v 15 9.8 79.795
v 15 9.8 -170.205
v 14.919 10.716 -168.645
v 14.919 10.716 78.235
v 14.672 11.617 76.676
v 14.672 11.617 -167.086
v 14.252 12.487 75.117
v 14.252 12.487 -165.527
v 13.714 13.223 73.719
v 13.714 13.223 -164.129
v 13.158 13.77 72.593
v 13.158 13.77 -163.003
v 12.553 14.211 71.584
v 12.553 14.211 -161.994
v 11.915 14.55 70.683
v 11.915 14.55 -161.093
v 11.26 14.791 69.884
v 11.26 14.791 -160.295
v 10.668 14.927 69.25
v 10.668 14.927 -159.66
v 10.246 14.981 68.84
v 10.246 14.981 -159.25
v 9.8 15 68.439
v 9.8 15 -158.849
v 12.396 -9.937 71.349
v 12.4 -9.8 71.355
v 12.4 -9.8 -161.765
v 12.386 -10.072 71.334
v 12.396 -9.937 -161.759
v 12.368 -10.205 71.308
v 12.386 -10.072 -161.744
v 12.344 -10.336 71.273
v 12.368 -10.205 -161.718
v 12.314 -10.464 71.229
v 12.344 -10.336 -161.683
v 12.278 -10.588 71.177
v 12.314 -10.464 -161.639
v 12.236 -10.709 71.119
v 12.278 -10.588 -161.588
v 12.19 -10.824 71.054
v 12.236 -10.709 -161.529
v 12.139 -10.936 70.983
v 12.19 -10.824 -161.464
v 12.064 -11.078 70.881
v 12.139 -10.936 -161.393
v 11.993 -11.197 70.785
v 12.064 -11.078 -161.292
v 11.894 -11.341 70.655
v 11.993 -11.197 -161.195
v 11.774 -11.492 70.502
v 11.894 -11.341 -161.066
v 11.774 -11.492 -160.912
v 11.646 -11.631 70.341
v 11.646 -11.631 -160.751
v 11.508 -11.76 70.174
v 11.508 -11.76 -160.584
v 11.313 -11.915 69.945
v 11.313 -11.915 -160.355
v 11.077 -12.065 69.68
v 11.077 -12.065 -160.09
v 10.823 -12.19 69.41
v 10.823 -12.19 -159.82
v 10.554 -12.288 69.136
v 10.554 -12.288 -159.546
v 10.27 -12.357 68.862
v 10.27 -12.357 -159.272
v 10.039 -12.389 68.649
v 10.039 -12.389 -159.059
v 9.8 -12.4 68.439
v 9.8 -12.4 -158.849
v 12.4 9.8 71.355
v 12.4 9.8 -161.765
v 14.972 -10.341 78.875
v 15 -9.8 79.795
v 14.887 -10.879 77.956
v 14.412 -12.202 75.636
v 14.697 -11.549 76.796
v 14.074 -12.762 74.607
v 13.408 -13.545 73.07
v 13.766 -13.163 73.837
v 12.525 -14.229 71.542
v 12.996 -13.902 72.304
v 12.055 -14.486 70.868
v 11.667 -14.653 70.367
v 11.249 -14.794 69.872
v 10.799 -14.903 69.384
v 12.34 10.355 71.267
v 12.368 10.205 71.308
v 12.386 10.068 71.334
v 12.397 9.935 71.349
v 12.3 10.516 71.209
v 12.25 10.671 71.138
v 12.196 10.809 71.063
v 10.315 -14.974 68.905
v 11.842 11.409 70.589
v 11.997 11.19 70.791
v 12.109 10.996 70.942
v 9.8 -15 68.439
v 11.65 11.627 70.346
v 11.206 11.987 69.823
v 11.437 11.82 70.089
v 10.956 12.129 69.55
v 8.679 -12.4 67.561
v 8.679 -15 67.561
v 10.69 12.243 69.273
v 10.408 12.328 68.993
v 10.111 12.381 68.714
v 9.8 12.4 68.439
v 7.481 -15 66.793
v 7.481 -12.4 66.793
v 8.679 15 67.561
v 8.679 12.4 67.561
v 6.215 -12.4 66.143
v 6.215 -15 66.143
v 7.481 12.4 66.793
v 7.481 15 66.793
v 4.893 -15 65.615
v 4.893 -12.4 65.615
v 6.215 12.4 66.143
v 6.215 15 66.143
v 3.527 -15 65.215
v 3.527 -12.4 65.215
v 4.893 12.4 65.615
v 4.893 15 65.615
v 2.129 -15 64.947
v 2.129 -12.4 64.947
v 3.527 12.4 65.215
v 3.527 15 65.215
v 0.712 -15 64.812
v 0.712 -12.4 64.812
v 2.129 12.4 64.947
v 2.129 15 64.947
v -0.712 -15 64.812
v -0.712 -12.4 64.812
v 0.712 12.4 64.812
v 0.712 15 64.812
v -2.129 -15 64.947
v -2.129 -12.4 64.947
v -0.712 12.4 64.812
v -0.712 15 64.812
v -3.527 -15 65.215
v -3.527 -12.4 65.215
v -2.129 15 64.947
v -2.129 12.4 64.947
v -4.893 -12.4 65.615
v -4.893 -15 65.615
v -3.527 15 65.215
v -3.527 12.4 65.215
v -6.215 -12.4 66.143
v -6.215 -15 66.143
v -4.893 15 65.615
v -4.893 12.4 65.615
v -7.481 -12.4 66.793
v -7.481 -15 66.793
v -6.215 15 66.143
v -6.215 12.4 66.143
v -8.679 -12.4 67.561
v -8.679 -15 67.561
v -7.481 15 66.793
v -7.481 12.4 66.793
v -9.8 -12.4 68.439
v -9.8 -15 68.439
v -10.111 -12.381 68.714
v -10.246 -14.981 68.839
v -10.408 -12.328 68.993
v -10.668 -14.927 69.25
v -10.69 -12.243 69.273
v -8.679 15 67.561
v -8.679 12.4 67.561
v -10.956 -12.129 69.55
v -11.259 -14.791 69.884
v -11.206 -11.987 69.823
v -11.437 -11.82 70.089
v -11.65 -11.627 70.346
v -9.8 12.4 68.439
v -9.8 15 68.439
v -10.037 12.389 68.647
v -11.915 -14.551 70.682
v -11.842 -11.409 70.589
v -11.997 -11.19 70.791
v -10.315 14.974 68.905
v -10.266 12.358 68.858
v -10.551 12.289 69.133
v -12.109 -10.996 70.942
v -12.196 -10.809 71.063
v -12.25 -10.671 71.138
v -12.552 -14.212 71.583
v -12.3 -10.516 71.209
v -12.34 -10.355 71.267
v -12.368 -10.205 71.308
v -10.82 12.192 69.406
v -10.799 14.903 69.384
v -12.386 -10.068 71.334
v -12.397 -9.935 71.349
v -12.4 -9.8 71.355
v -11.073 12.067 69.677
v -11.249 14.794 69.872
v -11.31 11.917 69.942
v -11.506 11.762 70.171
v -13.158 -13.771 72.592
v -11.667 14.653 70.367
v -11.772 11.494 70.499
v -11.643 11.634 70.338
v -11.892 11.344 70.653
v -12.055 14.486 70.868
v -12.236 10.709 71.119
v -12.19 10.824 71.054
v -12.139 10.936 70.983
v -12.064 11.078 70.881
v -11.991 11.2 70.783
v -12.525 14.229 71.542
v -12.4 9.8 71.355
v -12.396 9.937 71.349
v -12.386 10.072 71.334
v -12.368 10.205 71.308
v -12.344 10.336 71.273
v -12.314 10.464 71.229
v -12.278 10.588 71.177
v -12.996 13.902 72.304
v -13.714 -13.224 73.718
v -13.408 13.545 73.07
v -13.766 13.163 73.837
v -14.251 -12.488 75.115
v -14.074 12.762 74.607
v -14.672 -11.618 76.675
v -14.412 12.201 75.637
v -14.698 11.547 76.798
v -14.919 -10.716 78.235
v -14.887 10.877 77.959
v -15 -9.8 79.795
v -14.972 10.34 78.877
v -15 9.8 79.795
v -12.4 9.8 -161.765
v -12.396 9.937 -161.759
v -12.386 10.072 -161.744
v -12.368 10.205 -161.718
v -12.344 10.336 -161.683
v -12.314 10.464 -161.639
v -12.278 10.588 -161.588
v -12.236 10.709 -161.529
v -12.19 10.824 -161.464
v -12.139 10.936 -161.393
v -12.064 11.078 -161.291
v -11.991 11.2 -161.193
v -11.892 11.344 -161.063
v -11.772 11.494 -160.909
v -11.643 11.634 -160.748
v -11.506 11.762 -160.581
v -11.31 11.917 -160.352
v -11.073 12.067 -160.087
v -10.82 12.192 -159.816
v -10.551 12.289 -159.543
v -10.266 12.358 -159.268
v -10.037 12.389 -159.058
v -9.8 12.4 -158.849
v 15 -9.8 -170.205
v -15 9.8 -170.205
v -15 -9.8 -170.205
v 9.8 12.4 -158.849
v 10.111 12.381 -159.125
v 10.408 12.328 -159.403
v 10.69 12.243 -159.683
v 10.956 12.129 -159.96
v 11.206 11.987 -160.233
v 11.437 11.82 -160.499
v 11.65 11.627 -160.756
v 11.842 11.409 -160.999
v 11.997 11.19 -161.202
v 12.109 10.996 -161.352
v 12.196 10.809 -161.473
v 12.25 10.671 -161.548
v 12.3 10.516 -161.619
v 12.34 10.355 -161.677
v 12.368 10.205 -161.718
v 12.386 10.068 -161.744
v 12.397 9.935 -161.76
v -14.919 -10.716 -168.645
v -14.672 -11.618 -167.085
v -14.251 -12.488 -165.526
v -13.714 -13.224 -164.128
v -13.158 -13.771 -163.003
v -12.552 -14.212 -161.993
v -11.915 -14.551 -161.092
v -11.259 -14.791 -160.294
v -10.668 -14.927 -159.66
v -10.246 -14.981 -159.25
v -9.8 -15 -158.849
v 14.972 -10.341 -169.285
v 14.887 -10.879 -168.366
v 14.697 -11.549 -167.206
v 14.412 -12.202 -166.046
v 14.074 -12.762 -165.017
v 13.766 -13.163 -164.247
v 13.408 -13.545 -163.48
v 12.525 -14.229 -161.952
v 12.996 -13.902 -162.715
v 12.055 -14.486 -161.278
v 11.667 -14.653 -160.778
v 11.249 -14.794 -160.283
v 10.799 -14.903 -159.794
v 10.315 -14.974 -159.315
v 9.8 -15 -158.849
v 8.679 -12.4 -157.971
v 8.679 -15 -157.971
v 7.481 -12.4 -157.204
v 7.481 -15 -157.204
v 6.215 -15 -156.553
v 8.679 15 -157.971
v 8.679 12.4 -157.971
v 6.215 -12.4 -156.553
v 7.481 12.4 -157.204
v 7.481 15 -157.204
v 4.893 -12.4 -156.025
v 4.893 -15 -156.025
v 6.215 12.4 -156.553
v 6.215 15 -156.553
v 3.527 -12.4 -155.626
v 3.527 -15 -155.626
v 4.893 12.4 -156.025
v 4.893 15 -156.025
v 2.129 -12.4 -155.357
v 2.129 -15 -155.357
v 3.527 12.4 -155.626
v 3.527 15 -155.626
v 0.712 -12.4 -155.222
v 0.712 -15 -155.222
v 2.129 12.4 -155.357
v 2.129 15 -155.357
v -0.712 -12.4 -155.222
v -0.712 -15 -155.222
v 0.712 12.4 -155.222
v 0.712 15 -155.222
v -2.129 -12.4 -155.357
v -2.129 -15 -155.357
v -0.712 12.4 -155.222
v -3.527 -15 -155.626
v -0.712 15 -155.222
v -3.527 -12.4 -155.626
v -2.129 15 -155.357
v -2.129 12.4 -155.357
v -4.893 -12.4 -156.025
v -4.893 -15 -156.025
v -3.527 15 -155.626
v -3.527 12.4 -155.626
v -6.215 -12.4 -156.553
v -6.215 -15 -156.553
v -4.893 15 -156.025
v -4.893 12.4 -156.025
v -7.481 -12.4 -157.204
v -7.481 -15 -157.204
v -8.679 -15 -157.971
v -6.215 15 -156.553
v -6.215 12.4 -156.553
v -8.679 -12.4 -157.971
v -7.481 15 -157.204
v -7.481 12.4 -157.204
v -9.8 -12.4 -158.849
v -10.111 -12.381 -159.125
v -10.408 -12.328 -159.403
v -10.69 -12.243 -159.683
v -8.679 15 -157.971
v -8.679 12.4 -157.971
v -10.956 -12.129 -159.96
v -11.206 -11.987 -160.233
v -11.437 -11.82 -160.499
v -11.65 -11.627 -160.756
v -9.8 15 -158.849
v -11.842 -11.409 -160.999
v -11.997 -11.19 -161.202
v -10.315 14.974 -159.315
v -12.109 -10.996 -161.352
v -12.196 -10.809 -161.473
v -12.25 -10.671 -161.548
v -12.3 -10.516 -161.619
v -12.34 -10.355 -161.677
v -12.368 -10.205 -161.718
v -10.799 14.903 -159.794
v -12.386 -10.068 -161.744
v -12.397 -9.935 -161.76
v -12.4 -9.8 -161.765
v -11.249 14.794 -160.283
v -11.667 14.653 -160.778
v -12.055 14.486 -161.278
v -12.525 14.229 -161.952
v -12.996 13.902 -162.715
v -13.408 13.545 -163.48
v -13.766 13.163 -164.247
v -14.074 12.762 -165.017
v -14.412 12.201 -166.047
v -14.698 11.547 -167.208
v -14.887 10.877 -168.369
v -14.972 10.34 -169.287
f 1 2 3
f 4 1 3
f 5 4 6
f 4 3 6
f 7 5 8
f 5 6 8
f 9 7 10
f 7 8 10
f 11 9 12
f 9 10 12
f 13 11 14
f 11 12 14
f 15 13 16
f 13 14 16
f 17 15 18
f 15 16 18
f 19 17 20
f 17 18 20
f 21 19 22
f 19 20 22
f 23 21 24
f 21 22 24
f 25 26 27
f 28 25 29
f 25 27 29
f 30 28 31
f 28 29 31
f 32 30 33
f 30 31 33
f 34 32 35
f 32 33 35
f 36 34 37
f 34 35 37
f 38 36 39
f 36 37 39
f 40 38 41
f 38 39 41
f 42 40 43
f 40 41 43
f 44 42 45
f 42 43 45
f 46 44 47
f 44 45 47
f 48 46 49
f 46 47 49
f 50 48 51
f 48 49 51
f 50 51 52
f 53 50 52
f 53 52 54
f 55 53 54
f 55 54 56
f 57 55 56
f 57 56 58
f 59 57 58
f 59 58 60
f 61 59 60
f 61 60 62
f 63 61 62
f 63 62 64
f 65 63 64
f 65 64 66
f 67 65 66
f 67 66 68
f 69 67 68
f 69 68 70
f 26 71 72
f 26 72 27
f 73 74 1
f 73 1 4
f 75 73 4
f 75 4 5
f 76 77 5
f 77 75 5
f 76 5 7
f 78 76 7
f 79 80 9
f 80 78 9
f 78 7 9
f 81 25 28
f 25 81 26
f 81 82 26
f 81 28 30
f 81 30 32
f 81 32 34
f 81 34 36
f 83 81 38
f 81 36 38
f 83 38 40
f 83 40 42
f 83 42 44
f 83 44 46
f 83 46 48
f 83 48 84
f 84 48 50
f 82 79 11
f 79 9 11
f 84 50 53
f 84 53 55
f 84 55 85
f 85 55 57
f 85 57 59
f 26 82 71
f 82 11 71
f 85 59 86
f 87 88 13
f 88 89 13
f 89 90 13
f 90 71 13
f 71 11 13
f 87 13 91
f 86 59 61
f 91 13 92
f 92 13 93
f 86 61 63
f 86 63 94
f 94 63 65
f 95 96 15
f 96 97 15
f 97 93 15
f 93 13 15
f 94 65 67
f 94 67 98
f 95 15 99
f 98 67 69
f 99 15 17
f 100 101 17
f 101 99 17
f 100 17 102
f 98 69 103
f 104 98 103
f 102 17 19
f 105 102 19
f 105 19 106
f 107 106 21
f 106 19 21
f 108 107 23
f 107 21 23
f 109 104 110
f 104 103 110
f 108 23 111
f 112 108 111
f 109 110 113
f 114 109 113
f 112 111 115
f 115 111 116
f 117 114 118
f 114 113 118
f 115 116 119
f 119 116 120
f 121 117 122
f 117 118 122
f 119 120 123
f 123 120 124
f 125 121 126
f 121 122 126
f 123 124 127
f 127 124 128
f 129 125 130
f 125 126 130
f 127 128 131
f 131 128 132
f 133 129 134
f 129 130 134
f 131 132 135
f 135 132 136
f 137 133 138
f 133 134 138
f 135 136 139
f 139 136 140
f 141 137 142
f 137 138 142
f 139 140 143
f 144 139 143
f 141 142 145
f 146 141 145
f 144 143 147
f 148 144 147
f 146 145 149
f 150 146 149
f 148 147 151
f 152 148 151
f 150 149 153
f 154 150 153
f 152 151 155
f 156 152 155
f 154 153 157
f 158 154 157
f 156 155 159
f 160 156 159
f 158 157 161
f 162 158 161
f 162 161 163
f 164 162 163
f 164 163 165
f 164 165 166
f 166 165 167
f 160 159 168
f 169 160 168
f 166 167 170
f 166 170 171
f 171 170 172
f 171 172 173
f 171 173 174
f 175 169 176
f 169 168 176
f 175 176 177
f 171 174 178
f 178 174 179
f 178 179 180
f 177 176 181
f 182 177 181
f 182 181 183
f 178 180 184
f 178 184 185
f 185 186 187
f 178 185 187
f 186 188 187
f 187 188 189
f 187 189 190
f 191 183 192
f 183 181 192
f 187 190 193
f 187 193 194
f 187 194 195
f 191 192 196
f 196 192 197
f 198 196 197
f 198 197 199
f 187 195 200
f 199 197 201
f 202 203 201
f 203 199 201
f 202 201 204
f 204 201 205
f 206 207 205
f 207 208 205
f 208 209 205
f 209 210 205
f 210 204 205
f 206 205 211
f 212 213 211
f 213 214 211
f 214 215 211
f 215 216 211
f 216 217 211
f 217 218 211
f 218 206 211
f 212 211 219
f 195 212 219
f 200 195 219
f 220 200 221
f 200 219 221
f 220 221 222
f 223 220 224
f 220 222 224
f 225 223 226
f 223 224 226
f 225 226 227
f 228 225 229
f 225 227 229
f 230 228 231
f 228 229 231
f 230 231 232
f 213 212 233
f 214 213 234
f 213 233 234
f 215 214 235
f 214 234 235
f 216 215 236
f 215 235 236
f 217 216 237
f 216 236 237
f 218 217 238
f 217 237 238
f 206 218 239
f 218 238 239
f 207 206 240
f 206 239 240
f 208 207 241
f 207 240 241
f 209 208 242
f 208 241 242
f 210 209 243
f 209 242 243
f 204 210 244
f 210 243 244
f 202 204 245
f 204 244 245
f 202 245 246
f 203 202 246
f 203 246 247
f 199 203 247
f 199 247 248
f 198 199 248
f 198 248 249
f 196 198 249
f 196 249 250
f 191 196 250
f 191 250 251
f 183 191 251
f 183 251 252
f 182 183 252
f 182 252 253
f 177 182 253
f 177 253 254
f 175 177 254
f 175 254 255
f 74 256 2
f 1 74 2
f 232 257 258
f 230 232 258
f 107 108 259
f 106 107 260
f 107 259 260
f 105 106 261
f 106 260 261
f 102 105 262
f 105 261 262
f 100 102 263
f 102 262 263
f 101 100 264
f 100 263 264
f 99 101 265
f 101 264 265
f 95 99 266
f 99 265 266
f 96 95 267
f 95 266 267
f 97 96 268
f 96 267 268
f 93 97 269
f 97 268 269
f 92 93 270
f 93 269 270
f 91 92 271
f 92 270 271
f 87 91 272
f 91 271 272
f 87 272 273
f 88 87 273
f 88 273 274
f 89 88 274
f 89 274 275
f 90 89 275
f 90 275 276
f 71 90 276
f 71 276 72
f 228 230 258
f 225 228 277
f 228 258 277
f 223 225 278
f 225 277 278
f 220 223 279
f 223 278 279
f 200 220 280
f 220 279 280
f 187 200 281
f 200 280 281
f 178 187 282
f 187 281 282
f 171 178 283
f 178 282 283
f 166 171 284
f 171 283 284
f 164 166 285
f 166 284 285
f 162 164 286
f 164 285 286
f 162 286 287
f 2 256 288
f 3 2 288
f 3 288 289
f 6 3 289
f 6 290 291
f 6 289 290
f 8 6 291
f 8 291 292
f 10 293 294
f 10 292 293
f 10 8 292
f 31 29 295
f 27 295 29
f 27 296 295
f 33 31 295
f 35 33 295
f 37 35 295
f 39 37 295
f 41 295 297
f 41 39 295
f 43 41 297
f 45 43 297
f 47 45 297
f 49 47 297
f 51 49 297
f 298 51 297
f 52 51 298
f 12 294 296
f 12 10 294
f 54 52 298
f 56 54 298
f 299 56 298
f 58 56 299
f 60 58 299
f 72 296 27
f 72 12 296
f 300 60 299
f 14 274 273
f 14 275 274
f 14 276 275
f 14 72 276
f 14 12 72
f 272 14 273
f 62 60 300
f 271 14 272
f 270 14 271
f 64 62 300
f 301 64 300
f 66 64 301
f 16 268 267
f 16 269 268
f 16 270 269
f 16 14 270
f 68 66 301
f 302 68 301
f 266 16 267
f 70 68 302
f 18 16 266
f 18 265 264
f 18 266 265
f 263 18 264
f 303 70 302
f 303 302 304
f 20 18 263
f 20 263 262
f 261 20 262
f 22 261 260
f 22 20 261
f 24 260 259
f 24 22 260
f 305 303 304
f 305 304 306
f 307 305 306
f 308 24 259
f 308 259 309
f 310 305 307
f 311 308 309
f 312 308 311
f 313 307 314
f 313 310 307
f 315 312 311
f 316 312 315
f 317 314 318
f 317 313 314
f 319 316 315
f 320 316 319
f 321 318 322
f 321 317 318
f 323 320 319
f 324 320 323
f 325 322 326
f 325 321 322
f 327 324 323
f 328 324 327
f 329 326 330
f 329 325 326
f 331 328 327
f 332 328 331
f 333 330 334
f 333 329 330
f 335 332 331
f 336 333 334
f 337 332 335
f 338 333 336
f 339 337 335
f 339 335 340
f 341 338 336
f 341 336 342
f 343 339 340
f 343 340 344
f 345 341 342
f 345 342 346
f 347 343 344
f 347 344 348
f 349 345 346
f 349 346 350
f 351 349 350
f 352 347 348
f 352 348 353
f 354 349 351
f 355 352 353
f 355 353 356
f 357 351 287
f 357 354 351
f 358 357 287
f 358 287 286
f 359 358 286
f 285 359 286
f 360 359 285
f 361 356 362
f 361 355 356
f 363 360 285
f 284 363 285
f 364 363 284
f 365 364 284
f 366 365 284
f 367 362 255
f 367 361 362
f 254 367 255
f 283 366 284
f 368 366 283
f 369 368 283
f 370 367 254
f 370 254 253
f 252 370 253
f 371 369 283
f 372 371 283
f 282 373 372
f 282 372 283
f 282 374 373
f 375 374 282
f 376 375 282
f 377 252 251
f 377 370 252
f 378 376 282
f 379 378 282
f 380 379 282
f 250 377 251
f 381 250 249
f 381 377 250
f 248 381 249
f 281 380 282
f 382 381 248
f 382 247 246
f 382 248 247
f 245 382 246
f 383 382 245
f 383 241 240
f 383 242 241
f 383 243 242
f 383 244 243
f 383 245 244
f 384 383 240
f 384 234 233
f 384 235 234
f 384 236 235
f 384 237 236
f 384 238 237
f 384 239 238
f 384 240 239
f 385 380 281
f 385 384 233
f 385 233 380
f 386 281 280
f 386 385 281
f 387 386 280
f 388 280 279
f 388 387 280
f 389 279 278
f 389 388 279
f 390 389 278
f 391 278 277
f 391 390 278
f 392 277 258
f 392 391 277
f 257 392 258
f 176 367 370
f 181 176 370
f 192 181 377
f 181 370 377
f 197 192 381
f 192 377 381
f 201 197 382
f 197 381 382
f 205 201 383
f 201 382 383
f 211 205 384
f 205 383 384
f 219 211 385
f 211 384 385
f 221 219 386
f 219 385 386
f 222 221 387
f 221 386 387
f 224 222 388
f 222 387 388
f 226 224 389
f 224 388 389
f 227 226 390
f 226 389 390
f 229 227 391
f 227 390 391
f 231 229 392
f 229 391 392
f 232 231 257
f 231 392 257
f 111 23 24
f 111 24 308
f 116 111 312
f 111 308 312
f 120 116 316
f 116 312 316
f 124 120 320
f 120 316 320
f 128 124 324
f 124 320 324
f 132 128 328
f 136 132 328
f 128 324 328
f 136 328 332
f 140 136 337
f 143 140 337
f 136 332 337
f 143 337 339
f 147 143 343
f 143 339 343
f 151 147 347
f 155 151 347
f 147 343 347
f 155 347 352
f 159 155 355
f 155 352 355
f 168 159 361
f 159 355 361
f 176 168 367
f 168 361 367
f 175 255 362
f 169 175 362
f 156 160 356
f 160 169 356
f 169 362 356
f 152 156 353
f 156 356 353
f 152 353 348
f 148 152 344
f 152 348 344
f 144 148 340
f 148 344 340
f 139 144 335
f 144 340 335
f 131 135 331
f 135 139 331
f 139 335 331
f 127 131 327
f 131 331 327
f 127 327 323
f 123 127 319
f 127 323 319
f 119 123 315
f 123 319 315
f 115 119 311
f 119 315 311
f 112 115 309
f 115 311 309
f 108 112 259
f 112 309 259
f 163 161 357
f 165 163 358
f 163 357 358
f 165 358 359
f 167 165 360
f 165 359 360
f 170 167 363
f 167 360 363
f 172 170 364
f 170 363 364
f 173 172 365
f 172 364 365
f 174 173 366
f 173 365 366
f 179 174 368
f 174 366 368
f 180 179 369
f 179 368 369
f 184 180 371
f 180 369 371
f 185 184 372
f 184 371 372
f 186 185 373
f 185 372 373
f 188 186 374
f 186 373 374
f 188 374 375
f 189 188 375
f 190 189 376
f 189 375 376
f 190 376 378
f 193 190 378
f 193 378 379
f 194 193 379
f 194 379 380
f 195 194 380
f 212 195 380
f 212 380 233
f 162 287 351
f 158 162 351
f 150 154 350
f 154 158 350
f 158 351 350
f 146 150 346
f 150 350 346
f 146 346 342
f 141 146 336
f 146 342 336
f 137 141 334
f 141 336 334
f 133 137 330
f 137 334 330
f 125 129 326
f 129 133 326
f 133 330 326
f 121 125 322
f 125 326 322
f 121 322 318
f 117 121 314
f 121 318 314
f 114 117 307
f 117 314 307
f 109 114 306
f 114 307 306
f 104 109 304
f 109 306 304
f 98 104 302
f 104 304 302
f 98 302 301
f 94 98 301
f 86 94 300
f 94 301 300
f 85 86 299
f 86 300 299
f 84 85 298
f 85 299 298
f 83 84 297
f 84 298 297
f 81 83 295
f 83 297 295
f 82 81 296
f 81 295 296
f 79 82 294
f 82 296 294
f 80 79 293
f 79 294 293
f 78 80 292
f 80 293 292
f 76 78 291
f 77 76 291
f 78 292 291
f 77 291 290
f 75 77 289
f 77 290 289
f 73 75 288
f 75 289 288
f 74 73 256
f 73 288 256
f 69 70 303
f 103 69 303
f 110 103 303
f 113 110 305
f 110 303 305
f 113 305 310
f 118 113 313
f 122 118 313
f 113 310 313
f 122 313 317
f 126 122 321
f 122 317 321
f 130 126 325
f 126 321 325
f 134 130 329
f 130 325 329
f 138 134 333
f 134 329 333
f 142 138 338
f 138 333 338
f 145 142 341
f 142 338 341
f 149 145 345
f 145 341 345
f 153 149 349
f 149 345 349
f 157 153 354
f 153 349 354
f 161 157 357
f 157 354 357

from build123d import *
from OCP.BRepAlgoAPI import BRepAlgoAPI_Cut
from OCP.TopTools import TopTools_ListOfShape

# Parameters (mm, degrees)
SISTEMA_START              = -170.205087805
SISTEMA_ESTRUCTURAL2_DEPTH = 250
CORTAR_EXTRUIR2_DEPTH      = 32


with BuildPart() as part:
    # Sistema estructural2: read off the stored shape, not the designer's step
    # Sistema estructural2 outline → Sistema estructural2 (new body)
    with BuildSketch(Plane.XY.offset(SISTEMA_START)):
        with BuildLine():
            ThreePointArc((15, 9.8), (13.476955262, 13.476955262), (9.8, 15))
            Line((9.8, 15), (-9.8, 15))
            ThreePointArc((-9.8, 15), (-13.476955262, 13.476955262), (-15, 9.8))
            Line((-15, 9.8), (-15, -9.8))
            ThreePointArc((-15, -9.8), (-13.476955262, -13.476955262), (-9.8, -15))
            Line((-9.8, -15), (9.8, -15))
            ThreePointArc((9.8, -15), (13.476955262, -13.476955262), (15, -9.8))
            Line((15, -9.8), (15, 9.8))
        make_face()
        with BuildLine():
            ThreePointArc((12.4, -9.8), (11.638477631, -11.638477631), (9.8, -12.4))
            Line((9.8, -12.4), (-9.8, -12.4))
            ThreePointArc((-9.8, -12.4), (-11.638477631, -11.638477631), (-12.4, -9.8))
            Line((-12.4, -9.8), (-12.4, 9.8))
            ThreePointArc((-12.4, 9.8), (-11.638477631, 11.638477631), (-9.8, 12.4))
            Line((-9.8, 12.4), (9.8, 12.4))
            ThreePointArc((9.8, 12.4), (11.638477631, 11.638477631), (12.4, 9.8))
            Line((12.4, 9.8), (12.4, -9.8))
        make_face(mode=Mode.SUBTRACT)
    extrude(amount=SISTEMA_ESTRUCTURAL2_DEPTH)


with BuildPart() as cortar_extruir2_tool:
    # Croquis10 → Cortar-Extruir2 (new body)
    with BuildSketch(Plane(origin=(0, 15, 0), x_dir=(1, 0, 0), z_dir=(0, 1, 0))):
        with BuildLine():
            Line((-15, -79.794912195), (15, -79.794912195))
            ThreePointArc((15, -79.794912195), (0, -64.794912195), (-15, -79.794912195))
        make_face()
        with BuildLine():
            Line((-15, 170.205087805), (15, 170.205087805))
            ThreePointArc((15, 170.205087805), (0, 155.205087805), (-15, 170.205087805))
        make_face()
    extrude(amount=-CORTAR_EXTRUIR2_DEPTH)


with BuildPart() as part_1:
    add(part.part)

    # Cortar-Extruir2: cut by cortar_extruir2_tool, with a tolerance
    cortar_extruir2_stock = TopTools_ListOfShape()
    cortar_extruir2_stock.Append(part_1.part.wrapped)
    cortar_extruir2_tools = TopTools_ListOfShape()
    cortar_extruir2_tools.Append(cortar_extruir2_tool.part.wrapped)
    cortar_extruir2_cut = BRepAlgoAPI_Cut()
    cortar_extruir2_cut.SetArguments(cortar_extruir2_stock)
    cortar_extruir2_cut.SetTools(cortar_extruir2_tools)
    cortar_extruir2_cut.SetFuzzyValue(0.00001)
    cortar_extruir2_cut.Build()
    add(Compound.cast(cortar_extruir2_cut.Shape()).solids(), mode=Mode.REPLACE)


solid = part_1.part
